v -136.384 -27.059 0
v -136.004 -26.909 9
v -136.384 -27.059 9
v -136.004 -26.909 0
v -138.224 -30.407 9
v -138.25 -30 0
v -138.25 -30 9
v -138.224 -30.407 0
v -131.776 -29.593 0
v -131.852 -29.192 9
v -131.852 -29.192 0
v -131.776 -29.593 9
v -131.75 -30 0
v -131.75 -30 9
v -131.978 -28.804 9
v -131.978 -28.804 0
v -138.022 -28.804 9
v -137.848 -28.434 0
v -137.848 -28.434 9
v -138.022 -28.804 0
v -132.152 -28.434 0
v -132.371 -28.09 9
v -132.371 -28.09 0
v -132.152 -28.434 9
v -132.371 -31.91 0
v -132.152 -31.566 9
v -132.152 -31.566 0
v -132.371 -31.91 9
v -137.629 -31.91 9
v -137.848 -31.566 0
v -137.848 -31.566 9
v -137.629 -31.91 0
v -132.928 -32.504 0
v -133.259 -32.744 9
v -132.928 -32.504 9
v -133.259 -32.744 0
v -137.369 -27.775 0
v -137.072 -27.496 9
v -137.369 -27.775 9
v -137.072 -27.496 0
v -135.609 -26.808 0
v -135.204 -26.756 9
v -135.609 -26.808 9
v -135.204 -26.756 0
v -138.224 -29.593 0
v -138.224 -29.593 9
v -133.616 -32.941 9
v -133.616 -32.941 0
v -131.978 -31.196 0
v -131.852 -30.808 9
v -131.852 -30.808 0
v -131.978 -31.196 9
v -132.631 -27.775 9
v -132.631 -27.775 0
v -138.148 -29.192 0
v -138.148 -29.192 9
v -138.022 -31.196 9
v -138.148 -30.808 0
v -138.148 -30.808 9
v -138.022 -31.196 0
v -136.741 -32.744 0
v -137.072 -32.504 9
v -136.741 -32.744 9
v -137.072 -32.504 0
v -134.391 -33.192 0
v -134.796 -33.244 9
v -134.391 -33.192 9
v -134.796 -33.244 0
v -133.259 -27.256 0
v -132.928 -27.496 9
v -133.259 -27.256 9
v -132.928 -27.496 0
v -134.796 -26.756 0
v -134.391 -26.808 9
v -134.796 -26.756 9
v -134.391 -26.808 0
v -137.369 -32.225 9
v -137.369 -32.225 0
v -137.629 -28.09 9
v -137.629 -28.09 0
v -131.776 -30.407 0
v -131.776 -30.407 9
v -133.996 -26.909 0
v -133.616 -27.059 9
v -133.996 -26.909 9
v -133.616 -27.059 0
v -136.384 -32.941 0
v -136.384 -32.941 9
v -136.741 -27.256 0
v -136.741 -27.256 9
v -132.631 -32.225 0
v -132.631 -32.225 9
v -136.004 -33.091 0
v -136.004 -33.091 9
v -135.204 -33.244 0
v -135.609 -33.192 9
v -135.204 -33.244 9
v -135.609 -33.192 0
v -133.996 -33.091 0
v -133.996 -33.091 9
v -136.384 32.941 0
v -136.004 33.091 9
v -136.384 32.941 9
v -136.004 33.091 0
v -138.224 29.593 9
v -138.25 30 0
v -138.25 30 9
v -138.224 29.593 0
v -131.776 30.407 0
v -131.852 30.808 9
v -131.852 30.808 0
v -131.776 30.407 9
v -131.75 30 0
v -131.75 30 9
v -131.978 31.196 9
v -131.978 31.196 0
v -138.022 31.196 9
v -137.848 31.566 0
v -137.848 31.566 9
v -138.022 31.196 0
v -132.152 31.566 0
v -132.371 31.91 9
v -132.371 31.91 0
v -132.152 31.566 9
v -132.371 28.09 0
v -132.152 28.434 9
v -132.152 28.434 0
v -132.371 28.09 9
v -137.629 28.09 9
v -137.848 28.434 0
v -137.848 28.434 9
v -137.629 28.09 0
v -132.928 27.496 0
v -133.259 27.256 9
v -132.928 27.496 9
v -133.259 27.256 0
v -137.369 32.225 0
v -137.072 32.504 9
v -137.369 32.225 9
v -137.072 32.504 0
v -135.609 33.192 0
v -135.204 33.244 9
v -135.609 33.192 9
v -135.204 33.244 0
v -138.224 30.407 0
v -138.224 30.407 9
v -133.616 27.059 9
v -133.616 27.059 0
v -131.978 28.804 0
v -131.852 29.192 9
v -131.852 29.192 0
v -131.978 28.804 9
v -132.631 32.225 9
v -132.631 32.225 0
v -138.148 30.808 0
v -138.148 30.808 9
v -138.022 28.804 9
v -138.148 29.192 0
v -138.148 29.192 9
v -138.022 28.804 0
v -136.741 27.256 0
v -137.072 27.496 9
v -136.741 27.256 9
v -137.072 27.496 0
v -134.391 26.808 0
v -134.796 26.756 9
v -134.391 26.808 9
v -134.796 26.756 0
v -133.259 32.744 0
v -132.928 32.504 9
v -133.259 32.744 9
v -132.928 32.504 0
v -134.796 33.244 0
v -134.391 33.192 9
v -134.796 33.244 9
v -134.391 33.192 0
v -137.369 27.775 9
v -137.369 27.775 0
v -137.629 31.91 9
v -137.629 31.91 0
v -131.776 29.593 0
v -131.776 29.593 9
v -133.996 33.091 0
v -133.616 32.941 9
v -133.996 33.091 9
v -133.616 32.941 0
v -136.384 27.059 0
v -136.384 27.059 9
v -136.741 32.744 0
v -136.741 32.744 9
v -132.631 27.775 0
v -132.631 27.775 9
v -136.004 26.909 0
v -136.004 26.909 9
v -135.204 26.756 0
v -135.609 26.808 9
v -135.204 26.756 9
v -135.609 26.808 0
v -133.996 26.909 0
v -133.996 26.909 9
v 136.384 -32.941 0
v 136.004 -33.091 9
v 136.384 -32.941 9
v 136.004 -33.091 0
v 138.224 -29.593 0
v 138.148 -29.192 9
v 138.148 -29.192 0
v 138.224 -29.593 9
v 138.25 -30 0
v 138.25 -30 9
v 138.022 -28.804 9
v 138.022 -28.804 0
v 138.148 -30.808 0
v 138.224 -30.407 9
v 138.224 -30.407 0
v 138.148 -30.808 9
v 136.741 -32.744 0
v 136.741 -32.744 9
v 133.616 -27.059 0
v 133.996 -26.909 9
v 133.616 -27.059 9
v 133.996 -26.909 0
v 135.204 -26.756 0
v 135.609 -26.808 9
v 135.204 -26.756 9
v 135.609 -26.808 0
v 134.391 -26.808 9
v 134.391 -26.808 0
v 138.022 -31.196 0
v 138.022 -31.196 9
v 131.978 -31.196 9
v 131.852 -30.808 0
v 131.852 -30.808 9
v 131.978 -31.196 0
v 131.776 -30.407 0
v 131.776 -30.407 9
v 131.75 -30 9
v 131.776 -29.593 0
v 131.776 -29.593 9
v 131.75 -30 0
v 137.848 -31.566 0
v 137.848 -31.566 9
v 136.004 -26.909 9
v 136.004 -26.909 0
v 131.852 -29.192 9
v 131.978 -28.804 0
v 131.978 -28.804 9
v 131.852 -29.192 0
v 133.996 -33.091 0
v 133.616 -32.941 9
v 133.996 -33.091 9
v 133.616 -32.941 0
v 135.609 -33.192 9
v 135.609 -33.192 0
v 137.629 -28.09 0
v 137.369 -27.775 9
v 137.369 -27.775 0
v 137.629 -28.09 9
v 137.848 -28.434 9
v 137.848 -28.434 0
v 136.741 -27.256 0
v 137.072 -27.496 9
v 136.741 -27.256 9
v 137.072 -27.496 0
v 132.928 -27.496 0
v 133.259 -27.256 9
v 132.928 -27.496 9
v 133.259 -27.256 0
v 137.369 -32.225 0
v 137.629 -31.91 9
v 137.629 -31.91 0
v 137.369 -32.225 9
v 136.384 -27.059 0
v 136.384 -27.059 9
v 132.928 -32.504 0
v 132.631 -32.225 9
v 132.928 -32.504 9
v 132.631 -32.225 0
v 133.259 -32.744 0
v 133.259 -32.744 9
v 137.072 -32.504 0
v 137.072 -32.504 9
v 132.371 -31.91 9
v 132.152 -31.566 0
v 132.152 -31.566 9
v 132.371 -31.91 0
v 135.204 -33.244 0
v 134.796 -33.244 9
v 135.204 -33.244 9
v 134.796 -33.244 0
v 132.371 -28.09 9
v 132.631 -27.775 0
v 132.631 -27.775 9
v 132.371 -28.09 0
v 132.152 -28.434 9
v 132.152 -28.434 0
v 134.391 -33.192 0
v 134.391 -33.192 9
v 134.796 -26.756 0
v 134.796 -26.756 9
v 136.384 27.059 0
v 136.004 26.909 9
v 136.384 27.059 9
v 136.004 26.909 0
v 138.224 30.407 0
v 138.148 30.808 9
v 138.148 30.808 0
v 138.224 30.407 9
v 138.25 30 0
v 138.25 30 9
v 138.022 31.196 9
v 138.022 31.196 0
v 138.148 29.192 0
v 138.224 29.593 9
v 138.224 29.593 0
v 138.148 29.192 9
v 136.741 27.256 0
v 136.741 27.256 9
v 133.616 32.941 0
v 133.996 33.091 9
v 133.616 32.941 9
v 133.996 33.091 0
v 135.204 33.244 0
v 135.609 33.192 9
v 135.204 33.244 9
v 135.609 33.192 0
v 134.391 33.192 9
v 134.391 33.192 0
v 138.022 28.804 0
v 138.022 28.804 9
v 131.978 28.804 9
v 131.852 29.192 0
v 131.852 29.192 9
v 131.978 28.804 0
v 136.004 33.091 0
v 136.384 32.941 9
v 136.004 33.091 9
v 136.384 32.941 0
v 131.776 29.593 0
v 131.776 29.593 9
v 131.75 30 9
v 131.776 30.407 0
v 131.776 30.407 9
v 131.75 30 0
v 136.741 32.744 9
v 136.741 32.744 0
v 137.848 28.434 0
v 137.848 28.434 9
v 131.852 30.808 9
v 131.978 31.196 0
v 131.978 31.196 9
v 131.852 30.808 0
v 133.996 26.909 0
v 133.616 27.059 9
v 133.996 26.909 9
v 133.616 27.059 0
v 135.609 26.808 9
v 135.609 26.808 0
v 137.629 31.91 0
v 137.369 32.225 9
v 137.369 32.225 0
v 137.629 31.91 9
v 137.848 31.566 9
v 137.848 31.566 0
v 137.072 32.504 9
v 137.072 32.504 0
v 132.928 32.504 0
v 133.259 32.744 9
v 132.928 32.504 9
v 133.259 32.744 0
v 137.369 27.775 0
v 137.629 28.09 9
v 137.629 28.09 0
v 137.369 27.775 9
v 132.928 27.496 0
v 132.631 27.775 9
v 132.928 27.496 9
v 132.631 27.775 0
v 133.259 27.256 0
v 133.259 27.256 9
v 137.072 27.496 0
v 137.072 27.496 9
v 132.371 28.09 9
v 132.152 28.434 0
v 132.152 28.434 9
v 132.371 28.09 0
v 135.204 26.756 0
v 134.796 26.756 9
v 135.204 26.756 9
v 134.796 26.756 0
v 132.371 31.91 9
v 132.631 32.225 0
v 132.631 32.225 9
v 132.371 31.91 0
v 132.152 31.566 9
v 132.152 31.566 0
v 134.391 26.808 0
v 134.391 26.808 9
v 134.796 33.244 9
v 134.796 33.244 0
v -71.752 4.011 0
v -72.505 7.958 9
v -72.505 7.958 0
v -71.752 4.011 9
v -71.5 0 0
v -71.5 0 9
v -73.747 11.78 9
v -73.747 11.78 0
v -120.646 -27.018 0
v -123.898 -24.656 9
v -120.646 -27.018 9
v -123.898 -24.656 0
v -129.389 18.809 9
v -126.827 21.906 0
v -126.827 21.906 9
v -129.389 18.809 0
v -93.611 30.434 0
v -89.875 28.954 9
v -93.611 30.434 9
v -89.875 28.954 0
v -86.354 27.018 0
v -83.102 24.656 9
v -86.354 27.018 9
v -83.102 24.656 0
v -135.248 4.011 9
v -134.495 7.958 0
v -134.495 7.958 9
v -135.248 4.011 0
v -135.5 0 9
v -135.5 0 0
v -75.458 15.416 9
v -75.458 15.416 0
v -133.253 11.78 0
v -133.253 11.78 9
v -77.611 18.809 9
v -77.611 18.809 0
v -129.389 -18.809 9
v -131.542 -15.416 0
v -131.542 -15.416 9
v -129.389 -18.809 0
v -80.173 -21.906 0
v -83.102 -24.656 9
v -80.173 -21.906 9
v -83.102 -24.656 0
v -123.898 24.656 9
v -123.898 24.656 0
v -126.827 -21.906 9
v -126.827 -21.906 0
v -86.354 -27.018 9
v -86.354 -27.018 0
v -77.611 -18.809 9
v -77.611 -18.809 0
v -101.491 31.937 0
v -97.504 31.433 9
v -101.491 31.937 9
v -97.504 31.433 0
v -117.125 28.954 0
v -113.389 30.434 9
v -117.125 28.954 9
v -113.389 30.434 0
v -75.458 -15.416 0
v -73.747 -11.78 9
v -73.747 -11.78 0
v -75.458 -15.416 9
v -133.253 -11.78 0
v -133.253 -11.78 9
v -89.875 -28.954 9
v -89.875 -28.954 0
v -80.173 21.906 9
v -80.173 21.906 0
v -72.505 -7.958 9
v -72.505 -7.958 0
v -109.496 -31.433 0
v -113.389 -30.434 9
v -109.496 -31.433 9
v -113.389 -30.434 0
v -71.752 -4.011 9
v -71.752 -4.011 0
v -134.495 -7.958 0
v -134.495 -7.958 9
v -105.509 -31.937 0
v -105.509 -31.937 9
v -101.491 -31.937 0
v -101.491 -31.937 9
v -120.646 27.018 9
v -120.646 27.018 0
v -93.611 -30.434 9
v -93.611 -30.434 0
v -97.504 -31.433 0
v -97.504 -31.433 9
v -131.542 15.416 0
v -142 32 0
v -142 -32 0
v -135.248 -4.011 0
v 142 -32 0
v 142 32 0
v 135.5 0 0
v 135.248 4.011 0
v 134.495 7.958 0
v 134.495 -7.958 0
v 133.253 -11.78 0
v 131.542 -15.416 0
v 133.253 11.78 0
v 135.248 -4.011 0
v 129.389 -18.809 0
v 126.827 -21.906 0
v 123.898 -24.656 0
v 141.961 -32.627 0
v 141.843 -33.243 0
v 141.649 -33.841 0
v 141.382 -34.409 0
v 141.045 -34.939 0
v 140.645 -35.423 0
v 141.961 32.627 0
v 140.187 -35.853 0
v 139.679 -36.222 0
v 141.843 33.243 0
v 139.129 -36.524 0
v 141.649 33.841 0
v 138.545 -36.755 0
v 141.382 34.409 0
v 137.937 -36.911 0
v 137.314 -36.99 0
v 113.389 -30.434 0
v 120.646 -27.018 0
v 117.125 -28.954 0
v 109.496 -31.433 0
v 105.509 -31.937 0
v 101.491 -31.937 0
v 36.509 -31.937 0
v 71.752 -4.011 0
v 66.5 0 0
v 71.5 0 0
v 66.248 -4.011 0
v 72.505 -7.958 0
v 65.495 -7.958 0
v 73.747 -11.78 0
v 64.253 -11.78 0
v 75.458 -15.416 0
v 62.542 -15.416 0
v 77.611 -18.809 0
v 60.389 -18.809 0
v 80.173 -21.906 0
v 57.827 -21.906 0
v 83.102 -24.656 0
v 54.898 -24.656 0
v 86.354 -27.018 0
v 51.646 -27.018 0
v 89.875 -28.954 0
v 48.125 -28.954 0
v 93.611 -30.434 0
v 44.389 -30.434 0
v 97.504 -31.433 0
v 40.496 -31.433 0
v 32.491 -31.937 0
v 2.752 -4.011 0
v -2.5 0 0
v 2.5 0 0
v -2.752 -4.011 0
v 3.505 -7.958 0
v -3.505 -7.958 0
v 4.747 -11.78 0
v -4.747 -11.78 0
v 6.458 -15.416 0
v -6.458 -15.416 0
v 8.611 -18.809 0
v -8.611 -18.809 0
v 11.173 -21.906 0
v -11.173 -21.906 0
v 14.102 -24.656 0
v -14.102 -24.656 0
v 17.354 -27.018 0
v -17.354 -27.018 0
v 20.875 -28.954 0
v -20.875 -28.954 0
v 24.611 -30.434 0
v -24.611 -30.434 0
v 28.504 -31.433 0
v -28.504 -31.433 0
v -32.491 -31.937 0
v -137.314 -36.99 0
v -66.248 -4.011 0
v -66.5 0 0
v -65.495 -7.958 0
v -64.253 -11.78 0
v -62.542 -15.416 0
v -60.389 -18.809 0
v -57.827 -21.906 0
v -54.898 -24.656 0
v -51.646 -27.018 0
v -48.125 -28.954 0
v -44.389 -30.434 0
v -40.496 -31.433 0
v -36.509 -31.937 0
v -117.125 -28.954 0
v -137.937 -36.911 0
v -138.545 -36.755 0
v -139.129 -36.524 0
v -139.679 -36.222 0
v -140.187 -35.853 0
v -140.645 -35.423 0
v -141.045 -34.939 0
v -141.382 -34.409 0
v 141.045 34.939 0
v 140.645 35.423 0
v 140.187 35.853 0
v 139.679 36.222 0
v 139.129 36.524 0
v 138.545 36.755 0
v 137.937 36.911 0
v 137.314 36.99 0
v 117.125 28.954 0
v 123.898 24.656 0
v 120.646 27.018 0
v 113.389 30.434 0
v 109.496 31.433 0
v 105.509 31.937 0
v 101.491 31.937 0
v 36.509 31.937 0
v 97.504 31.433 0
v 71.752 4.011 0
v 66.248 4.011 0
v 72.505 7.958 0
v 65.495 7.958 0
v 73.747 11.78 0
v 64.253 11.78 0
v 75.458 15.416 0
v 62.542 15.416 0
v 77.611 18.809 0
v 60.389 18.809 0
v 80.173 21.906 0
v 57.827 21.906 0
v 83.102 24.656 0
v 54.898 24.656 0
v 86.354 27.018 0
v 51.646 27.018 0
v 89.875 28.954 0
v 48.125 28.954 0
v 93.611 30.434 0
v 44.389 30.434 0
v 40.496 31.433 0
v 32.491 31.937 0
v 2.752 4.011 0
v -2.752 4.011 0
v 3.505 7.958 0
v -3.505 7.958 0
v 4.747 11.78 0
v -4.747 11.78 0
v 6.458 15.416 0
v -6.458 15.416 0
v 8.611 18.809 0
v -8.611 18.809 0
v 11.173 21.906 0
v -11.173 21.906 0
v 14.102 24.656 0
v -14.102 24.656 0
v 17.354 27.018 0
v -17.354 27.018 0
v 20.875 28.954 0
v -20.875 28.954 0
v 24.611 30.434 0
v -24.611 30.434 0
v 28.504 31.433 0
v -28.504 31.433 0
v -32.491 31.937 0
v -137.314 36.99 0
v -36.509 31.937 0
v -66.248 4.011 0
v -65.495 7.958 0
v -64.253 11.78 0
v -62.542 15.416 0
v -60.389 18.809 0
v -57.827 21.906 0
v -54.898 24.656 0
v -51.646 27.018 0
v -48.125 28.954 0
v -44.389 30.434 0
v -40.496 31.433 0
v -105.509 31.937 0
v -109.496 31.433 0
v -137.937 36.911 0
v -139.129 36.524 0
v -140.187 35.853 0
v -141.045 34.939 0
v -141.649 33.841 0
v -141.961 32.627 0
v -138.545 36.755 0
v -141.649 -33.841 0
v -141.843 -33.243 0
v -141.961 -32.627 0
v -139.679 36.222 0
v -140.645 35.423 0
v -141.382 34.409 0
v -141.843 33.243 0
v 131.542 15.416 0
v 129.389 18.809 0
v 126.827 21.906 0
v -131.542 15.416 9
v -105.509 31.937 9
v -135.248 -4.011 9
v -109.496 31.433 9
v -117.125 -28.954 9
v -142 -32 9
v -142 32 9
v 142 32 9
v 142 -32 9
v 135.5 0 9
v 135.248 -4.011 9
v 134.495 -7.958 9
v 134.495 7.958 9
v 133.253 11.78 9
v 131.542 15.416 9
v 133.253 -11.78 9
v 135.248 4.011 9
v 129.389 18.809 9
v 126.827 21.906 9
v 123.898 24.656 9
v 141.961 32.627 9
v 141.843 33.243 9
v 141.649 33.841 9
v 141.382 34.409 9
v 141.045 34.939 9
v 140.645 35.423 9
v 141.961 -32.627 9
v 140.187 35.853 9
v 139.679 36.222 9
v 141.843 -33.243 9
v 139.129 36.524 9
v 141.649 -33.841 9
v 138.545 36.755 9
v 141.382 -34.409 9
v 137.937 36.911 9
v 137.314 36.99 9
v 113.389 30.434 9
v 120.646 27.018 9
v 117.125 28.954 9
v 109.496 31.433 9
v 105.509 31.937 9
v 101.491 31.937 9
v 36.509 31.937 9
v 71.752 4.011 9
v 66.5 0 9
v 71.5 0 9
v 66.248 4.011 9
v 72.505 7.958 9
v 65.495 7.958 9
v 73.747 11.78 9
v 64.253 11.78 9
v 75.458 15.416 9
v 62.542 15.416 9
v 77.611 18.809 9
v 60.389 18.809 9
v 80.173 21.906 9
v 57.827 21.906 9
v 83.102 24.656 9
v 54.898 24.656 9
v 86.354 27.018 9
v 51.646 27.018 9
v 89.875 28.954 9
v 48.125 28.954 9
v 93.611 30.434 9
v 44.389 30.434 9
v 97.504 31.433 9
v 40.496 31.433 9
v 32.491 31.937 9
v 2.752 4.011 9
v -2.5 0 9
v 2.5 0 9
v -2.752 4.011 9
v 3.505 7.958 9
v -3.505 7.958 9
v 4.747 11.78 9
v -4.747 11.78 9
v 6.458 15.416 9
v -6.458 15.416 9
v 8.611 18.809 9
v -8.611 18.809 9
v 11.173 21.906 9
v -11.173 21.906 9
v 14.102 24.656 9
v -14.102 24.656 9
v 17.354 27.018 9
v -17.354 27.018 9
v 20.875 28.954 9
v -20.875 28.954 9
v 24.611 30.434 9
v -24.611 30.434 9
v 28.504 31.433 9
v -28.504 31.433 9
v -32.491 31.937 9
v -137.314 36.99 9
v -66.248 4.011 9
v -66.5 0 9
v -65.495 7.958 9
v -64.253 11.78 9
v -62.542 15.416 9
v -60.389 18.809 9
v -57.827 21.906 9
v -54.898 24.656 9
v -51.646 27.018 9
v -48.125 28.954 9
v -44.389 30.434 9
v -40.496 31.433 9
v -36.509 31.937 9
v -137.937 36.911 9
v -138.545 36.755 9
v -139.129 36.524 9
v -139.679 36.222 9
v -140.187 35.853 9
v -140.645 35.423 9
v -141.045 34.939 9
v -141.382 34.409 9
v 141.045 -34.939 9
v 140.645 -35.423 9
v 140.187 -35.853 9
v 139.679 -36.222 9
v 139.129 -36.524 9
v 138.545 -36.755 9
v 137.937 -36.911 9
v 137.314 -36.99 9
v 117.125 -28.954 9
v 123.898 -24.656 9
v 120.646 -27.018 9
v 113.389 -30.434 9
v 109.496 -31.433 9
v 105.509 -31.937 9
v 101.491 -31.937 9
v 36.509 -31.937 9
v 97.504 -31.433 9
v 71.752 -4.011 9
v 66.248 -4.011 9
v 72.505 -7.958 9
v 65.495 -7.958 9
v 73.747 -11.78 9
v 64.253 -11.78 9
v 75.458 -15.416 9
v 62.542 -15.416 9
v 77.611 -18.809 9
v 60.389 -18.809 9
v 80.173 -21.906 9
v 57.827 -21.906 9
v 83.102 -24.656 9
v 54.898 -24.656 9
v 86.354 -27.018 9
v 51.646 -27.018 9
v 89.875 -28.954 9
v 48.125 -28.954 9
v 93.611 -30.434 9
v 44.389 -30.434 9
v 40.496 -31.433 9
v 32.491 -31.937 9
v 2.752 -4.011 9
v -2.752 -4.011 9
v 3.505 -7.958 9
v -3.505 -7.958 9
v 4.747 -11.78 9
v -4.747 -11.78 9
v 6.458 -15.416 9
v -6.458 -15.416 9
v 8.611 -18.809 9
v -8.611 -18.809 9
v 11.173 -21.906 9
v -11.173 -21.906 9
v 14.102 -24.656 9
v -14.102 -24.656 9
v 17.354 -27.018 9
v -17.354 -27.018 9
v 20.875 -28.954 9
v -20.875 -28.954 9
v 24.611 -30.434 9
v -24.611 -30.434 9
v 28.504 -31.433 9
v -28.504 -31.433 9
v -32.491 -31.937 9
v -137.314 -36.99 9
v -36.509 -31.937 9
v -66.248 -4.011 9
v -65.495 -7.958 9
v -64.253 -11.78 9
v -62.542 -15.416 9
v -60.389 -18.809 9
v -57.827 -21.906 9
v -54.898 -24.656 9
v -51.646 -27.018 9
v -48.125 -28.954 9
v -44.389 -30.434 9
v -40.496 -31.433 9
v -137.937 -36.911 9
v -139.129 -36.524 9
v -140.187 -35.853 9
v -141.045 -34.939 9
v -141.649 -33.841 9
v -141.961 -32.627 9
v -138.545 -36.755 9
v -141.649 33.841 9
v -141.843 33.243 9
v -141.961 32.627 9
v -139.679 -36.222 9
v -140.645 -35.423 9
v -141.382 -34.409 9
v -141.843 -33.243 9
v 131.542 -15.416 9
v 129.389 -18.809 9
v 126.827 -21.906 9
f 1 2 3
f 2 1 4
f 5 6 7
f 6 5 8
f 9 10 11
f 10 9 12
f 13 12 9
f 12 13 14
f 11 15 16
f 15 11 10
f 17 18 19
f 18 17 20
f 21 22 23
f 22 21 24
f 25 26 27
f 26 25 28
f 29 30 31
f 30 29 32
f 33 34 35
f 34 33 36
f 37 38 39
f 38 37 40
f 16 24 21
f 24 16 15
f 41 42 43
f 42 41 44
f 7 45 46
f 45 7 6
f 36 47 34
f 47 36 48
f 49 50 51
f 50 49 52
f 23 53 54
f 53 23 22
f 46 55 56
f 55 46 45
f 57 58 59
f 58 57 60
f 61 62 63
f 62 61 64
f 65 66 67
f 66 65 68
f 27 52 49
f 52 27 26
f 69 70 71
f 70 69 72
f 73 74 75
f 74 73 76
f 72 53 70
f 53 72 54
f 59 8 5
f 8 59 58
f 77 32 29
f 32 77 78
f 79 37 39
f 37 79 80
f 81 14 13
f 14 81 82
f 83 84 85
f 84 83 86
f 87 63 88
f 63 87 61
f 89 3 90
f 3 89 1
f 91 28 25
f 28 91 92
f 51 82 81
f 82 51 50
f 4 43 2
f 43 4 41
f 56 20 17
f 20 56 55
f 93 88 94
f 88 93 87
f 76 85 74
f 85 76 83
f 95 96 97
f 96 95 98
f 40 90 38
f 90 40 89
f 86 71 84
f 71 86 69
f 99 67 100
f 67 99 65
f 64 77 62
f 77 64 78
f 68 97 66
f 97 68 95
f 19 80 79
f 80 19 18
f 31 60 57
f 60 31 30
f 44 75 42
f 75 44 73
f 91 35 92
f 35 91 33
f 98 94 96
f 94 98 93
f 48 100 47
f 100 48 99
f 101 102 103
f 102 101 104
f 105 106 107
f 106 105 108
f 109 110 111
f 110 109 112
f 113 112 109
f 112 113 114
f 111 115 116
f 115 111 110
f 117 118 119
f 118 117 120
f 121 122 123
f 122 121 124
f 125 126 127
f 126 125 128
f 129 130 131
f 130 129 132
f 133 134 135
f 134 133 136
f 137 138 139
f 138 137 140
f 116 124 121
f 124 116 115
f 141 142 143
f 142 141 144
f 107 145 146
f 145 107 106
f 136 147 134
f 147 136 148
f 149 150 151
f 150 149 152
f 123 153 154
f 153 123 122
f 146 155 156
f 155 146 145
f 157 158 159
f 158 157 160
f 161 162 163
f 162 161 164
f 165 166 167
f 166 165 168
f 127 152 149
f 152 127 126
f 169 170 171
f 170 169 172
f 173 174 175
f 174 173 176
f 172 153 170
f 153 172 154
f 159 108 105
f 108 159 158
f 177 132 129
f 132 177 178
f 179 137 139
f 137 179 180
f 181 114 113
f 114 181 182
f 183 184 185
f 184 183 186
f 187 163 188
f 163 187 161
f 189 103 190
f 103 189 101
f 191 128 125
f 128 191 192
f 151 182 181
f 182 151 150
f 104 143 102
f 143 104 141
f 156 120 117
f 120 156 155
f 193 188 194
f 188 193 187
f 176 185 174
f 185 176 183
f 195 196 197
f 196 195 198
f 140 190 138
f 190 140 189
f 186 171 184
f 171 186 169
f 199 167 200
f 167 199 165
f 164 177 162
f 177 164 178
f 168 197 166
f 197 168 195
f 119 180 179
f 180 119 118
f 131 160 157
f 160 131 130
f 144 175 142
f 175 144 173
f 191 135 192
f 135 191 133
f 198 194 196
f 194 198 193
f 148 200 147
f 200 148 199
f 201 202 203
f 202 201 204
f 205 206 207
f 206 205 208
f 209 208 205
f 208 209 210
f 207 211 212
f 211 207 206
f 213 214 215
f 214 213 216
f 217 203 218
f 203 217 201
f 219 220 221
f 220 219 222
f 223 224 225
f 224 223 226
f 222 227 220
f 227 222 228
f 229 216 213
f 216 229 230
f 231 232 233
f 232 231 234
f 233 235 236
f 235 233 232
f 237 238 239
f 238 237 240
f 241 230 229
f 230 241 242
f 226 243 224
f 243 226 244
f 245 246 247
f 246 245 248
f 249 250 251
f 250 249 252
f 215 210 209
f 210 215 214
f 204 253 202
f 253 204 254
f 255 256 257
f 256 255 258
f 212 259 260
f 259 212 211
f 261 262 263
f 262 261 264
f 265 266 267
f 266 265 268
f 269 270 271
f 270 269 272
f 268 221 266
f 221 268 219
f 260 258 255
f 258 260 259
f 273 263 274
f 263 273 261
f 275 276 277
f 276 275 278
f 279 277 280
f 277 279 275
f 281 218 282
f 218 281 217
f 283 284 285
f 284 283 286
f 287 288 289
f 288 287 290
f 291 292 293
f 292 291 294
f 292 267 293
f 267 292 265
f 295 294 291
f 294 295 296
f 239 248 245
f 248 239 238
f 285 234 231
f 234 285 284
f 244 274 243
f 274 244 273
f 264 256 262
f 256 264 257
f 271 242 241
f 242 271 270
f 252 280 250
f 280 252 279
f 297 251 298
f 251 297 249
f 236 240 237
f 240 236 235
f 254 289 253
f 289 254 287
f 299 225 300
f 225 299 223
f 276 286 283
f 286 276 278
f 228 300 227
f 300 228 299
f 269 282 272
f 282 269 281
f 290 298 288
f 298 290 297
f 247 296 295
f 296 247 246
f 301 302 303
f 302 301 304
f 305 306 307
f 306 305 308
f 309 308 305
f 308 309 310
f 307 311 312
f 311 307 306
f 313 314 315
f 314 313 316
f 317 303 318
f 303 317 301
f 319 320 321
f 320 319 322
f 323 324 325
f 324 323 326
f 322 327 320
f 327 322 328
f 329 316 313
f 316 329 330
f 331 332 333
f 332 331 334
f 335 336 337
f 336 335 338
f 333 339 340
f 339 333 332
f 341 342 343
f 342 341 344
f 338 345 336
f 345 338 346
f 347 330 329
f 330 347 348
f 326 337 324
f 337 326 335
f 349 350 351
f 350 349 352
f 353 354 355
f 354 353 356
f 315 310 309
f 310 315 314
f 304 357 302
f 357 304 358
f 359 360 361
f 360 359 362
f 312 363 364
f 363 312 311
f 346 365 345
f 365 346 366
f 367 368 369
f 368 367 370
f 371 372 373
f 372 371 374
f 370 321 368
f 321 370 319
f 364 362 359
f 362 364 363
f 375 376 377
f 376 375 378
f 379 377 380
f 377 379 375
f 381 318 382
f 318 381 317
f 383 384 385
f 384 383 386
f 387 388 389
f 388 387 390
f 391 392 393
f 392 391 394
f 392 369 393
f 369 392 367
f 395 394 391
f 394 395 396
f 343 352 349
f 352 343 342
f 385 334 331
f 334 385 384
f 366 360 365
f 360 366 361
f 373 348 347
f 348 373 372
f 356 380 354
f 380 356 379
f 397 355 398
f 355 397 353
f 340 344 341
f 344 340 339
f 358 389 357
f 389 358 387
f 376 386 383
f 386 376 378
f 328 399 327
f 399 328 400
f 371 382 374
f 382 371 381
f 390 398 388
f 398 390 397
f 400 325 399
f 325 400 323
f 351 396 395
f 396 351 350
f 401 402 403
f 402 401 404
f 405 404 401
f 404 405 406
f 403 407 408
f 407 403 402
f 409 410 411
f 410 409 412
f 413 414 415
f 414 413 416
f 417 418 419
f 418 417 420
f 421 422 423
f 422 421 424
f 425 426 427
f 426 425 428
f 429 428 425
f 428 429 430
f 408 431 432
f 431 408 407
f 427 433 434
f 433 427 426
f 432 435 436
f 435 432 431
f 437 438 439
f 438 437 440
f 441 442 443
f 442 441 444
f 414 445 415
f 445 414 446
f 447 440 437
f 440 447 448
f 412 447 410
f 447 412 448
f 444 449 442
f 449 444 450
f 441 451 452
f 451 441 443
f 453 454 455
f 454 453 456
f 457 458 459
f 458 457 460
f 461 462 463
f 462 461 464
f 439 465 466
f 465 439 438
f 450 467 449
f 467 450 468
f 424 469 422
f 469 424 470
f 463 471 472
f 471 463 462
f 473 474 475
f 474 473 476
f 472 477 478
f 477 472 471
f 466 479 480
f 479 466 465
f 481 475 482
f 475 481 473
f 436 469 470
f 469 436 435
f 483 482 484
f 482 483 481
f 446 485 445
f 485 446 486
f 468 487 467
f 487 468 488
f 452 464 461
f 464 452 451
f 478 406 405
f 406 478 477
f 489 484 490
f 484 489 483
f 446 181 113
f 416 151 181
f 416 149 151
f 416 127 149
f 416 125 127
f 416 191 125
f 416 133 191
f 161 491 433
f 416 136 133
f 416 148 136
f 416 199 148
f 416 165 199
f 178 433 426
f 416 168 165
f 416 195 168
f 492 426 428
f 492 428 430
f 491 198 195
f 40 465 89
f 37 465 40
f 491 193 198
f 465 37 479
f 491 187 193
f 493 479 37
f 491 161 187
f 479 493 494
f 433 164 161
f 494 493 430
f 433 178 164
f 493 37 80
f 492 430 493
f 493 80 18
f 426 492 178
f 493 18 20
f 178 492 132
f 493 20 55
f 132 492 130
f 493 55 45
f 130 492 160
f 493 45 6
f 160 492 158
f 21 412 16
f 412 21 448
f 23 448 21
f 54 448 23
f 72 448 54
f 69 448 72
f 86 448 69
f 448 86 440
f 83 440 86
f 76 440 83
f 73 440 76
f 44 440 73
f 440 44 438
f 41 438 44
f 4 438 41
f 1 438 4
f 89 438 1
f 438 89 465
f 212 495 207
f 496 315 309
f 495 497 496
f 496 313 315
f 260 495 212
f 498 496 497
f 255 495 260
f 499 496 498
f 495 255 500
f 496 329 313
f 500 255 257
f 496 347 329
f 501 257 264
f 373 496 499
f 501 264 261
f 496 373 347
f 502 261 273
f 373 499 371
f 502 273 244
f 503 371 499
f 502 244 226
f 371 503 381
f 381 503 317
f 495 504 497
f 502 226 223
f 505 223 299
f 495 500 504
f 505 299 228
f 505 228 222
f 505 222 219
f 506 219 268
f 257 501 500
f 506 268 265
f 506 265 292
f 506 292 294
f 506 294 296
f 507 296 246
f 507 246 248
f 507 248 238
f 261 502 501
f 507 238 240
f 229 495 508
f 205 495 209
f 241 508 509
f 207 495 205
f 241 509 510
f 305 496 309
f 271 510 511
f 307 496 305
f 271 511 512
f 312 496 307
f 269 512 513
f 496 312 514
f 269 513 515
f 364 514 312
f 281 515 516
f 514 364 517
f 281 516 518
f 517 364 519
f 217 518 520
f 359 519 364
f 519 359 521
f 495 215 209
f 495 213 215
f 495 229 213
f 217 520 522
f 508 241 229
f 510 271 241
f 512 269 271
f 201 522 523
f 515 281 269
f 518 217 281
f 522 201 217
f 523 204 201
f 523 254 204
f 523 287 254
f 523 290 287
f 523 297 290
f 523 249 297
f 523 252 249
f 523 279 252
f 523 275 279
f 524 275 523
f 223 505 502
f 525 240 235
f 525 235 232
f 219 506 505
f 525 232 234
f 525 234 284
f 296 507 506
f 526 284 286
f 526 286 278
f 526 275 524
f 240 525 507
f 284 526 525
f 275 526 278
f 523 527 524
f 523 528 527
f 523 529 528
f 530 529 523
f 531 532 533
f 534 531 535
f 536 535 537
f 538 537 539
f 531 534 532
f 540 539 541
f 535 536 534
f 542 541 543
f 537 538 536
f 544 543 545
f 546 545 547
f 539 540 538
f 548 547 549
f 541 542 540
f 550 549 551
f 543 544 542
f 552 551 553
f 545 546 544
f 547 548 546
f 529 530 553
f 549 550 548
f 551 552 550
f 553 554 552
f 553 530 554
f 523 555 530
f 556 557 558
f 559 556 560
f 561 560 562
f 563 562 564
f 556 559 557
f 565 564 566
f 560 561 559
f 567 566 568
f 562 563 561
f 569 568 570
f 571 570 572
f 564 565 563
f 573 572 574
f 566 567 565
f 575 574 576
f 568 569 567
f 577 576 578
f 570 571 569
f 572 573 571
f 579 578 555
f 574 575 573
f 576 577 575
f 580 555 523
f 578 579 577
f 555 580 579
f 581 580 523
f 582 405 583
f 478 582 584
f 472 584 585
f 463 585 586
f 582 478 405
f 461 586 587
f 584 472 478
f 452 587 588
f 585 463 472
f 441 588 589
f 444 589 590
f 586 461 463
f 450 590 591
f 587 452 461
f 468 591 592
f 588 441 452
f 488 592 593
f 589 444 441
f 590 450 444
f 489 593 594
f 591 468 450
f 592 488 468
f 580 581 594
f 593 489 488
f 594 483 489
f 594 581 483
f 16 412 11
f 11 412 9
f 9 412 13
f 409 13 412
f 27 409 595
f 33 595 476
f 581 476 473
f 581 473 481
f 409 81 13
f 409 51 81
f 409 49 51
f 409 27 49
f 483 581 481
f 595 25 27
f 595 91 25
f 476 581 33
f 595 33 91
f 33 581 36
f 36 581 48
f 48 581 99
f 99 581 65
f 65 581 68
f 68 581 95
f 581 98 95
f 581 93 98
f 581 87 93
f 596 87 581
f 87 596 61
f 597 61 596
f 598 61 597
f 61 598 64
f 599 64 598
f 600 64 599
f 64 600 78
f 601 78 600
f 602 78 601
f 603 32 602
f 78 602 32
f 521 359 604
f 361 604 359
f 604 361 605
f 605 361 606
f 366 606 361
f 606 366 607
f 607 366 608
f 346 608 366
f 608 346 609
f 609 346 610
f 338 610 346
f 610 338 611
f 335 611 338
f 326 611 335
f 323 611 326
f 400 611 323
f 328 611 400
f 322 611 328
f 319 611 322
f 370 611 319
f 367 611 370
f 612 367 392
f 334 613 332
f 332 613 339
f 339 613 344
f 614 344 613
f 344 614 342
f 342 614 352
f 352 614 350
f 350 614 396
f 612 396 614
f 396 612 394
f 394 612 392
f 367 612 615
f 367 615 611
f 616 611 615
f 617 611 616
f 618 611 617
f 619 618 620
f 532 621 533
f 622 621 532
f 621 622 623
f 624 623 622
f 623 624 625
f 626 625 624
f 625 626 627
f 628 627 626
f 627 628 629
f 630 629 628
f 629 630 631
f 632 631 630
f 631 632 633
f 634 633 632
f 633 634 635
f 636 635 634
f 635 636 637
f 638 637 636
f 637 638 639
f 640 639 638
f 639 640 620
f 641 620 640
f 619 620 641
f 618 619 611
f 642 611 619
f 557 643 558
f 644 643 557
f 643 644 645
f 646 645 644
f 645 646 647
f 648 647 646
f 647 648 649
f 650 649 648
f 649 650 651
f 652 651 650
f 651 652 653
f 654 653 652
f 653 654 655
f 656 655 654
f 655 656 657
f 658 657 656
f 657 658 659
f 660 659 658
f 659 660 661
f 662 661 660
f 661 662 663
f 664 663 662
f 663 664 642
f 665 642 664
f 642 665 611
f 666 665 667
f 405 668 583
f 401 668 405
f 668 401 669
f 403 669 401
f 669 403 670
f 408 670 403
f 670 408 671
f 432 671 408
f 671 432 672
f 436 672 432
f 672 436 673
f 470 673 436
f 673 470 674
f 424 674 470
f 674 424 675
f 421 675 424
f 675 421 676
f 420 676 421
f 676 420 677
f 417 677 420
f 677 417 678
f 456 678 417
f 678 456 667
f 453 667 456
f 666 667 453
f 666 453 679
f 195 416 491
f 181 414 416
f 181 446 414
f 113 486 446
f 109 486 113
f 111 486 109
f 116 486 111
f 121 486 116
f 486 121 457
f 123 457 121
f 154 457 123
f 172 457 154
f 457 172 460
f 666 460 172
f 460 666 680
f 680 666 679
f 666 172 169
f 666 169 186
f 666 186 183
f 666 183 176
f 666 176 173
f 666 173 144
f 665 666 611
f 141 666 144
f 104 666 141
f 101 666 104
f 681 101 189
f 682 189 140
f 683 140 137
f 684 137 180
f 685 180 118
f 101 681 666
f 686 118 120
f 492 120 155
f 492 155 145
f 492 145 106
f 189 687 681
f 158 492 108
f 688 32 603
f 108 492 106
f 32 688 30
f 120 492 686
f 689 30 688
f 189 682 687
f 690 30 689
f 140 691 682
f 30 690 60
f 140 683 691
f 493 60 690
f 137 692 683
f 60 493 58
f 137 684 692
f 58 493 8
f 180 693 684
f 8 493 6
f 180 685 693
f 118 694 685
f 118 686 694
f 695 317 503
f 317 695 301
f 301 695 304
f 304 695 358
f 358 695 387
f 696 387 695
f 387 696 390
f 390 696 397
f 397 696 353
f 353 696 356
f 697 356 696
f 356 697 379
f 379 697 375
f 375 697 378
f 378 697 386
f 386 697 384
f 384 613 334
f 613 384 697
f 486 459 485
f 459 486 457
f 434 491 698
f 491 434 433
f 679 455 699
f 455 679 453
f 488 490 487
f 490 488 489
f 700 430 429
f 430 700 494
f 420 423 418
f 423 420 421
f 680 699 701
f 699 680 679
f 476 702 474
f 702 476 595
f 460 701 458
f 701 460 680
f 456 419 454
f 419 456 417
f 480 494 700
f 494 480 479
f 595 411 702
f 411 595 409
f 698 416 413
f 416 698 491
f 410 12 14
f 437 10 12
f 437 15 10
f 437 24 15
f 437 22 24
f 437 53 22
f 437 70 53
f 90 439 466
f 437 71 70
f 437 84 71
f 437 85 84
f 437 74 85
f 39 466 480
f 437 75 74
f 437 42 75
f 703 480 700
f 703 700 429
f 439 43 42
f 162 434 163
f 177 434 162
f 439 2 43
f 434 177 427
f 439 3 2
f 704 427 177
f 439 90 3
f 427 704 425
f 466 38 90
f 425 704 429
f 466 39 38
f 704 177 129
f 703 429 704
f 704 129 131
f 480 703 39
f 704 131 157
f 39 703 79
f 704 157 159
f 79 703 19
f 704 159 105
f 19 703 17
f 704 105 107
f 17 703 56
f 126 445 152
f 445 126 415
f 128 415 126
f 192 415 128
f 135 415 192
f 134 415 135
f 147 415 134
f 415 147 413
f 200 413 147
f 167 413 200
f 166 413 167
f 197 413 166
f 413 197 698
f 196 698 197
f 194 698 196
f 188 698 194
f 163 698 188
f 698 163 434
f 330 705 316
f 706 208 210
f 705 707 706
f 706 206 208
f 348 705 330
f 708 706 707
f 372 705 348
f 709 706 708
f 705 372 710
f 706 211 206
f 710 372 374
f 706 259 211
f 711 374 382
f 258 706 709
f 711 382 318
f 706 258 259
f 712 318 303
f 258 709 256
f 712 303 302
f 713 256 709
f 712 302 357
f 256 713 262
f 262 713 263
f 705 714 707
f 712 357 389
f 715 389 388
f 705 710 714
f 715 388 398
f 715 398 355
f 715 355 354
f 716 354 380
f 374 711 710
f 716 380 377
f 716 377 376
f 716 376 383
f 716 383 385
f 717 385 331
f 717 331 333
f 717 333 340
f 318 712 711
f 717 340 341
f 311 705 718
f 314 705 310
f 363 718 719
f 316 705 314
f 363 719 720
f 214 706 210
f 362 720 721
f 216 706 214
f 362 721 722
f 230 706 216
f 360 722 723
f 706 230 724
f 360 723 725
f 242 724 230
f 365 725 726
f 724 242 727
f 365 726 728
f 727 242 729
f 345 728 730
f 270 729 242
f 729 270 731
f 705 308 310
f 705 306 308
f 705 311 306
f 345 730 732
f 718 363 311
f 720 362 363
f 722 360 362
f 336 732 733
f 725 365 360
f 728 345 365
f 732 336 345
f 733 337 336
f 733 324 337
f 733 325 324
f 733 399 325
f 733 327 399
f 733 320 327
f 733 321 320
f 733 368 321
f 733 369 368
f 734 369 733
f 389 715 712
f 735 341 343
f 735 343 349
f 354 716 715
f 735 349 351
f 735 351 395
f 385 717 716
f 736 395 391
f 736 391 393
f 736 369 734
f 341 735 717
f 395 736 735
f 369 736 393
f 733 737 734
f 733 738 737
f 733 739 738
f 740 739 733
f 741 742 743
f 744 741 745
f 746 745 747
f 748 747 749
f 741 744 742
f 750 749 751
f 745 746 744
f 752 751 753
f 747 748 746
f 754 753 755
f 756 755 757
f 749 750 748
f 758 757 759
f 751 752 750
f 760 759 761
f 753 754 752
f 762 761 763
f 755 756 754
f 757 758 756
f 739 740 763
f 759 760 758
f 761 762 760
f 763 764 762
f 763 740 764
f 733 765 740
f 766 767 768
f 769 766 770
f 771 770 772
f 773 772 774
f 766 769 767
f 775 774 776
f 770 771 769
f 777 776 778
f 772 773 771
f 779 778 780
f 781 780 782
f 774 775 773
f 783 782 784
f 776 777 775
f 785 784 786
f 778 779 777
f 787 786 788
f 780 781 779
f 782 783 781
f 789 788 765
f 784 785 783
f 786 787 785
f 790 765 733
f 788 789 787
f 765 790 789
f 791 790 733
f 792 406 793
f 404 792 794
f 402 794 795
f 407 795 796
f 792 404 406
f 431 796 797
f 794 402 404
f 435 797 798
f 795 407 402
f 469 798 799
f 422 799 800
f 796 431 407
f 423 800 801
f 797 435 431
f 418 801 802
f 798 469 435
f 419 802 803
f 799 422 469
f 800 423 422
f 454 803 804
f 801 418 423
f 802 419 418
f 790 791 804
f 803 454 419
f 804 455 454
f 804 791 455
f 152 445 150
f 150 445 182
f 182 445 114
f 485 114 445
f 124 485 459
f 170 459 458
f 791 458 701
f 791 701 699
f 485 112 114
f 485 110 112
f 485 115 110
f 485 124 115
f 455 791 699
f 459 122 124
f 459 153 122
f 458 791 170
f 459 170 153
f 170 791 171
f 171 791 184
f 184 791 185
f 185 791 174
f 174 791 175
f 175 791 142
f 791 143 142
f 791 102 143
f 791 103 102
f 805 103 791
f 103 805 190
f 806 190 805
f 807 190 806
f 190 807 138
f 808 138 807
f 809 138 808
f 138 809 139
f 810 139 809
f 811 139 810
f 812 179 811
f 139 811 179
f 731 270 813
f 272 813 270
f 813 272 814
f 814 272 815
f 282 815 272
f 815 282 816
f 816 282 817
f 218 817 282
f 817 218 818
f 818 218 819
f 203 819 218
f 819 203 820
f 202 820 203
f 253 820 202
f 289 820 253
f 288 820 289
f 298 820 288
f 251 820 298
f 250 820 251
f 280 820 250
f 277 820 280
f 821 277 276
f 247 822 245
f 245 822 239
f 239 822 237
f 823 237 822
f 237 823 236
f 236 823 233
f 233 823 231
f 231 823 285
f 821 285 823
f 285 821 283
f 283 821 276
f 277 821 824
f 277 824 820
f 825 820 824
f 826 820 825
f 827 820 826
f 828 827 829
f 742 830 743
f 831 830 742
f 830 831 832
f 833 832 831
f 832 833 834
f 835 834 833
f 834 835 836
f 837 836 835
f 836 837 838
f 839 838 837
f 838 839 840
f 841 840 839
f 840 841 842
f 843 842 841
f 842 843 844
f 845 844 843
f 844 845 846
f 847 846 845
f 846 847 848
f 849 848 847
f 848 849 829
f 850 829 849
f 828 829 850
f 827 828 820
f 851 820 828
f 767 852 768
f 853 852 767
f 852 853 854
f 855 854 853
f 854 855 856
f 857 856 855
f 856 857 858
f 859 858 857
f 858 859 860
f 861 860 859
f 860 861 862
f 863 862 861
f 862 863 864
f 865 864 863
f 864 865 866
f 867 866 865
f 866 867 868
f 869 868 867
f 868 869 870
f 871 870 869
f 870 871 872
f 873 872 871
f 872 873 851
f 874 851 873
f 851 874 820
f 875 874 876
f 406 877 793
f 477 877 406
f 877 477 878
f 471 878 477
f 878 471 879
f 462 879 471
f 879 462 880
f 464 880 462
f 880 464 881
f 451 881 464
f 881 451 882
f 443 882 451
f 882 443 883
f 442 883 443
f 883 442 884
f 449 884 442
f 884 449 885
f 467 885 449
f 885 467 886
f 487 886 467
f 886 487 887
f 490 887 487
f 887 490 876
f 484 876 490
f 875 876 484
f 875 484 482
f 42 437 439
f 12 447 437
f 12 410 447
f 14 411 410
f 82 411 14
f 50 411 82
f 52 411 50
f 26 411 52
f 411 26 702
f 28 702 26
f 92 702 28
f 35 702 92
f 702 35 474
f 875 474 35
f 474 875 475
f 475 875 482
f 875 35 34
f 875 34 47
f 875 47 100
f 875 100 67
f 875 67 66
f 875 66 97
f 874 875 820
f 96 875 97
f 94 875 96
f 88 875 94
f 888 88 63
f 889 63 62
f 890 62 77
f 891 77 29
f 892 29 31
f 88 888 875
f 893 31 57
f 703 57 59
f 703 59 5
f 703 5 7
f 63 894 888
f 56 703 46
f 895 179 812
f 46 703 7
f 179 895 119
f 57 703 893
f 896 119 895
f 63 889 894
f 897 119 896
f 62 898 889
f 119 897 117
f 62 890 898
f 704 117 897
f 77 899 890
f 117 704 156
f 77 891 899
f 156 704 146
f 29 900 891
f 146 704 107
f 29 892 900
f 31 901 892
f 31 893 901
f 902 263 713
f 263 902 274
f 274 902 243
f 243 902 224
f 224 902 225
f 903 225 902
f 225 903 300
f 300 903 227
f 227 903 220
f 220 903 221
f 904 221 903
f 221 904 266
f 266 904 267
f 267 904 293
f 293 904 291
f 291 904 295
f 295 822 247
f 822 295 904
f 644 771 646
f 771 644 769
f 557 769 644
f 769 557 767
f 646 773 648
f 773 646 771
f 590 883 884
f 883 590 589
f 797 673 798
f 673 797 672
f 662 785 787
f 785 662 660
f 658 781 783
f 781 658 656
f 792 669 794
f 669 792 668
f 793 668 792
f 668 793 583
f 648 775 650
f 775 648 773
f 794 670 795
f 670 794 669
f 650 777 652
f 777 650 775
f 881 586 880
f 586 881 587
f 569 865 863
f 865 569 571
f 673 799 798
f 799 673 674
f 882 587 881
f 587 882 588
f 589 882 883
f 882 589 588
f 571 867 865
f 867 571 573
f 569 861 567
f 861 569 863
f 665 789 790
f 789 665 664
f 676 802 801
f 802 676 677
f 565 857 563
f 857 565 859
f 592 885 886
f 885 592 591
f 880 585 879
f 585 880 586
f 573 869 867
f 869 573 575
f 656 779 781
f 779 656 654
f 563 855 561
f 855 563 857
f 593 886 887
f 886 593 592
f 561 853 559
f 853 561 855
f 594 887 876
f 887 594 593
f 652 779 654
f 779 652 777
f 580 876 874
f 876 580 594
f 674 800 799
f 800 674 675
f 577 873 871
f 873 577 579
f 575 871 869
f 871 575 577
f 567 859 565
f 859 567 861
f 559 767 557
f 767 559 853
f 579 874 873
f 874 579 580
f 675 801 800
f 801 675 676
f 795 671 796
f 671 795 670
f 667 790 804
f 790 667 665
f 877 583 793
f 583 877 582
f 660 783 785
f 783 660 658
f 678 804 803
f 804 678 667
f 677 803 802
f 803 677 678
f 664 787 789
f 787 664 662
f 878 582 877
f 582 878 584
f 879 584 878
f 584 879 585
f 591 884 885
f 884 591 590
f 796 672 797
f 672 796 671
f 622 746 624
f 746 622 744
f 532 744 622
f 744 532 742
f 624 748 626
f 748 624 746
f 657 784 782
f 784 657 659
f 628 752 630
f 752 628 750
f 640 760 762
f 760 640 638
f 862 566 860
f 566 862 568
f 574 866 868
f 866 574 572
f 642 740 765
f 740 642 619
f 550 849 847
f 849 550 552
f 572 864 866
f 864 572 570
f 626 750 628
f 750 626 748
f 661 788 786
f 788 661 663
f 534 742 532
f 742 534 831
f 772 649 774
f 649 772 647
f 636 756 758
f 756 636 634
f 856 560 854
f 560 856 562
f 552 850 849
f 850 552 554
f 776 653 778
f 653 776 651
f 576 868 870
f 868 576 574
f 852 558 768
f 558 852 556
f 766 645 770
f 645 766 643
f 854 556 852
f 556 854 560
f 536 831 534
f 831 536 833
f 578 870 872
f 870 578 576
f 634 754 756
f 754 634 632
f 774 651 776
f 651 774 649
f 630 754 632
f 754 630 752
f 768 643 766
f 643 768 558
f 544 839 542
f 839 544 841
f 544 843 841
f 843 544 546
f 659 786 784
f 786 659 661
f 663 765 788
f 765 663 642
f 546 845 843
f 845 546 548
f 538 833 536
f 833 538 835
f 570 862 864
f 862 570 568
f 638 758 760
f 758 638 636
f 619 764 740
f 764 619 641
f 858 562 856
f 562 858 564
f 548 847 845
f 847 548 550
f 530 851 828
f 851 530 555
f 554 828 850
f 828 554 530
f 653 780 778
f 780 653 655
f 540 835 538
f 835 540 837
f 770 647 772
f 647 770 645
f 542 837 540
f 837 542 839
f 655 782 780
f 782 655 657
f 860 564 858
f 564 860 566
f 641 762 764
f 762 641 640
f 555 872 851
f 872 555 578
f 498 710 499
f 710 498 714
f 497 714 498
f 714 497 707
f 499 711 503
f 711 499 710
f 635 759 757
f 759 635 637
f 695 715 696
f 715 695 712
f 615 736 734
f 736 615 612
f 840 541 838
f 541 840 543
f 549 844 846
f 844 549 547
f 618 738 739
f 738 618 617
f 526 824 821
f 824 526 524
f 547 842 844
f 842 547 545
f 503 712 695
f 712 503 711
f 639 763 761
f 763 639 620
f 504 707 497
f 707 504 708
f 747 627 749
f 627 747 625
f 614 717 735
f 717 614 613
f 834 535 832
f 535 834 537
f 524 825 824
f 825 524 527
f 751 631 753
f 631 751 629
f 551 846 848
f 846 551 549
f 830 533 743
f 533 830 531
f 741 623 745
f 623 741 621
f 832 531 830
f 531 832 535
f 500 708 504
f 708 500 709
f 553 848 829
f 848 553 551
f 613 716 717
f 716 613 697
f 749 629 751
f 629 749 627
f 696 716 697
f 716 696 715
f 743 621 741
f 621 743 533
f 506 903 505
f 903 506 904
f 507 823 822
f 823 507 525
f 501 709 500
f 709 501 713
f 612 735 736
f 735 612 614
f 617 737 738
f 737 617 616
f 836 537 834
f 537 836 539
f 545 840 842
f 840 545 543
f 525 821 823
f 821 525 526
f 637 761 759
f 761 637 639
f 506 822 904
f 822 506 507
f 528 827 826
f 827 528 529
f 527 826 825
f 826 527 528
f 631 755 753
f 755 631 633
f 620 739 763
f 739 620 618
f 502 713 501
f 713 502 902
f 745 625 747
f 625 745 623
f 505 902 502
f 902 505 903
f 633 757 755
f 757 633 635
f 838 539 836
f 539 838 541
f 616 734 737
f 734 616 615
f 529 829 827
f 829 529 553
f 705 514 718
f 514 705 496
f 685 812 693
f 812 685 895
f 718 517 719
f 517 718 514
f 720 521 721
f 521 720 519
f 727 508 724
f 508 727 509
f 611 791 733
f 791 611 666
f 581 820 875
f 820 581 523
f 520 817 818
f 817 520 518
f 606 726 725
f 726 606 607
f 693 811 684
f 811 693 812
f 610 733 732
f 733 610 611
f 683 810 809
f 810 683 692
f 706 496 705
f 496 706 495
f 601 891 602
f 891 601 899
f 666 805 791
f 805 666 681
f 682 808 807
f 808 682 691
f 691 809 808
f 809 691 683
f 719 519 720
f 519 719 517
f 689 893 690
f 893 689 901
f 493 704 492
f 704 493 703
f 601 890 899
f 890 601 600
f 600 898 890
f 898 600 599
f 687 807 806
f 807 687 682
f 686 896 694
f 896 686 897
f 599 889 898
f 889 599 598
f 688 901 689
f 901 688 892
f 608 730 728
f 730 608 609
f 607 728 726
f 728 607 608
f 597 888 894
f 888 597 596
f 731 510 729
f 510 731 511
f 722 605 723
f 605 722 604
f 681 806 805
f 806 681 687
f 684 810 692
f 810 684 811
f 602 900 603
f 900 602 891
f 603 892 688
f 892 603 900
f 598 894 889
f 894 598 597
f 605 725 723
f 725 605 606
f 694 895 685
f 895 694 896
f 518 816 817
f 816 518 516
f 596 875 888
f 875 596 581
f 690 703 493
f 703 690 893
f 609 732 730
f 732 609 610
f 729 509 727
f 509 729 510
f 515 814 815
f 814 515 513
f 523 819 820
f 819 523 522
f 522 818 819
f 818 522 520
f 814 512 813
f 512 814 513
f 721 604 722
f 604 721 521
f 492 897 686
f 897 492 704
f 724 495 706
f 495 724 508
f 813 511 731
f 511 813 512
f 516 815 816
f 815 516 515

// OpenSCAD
$fn = 50;


difference() {
	union() {
		hull() {
			translate(v = [-137.0000000000, 32.0000000000, 0]) {
				cylinder(h = 9, r = 5);
			}
			translate(v = [137.0000000000, 32.0000000000, 0]) {
				cylinder(h = 9, r = 5);
			}
			translate(v = [-137.0000000000, -32.0000000000, 0]) {
				cylinder(h = 9, r = 5);
			}
			translate(v = [137.0000000000, -32.0000000000, 0]) {
				cylinder(h = 9, r = 5);
			}
		}
	}
	union() {
		#translate(v = [-135.0000000000, -30.0000000000, -100.0000000000]) {
			cylinder(h = 200, r = 3.2500000000);
		}
		#translate(v = [-135.0000000000, 30.0000000000, -100.0000000000]) {
			cylinder(h = 200, r = 3.2500000000);
		}
		#translate(v = [135.0000000000, -30.0000000000, -100.0000000000]) {
			cylinder(h = 200, r = 3.2500000000);
		}
		#translate(v = [135.0000000000, 30.0000000000, -100.0000000000]) {
			cylinder(h = 200, r = 3.2500000000);
		}
		#translate(v = [-103.5000000000, 0, 0]) {
			cylinder(h = 9, r = 32.0000000000);
		}
		#translate(v = [-34.5000000000, 0, 0]) {
			cylinder(h = 9, r = 32.0000000000);
		}
		#translate(v = [34.5000000000, 0, 0]) {
			cylinder(h = 9, r = 32.0000000000);
		}
		#translate(v = [103.5000000000, 0, 0]) {
			cylinder(h = 9, r = 32.0000000000);
		}
	}
}
